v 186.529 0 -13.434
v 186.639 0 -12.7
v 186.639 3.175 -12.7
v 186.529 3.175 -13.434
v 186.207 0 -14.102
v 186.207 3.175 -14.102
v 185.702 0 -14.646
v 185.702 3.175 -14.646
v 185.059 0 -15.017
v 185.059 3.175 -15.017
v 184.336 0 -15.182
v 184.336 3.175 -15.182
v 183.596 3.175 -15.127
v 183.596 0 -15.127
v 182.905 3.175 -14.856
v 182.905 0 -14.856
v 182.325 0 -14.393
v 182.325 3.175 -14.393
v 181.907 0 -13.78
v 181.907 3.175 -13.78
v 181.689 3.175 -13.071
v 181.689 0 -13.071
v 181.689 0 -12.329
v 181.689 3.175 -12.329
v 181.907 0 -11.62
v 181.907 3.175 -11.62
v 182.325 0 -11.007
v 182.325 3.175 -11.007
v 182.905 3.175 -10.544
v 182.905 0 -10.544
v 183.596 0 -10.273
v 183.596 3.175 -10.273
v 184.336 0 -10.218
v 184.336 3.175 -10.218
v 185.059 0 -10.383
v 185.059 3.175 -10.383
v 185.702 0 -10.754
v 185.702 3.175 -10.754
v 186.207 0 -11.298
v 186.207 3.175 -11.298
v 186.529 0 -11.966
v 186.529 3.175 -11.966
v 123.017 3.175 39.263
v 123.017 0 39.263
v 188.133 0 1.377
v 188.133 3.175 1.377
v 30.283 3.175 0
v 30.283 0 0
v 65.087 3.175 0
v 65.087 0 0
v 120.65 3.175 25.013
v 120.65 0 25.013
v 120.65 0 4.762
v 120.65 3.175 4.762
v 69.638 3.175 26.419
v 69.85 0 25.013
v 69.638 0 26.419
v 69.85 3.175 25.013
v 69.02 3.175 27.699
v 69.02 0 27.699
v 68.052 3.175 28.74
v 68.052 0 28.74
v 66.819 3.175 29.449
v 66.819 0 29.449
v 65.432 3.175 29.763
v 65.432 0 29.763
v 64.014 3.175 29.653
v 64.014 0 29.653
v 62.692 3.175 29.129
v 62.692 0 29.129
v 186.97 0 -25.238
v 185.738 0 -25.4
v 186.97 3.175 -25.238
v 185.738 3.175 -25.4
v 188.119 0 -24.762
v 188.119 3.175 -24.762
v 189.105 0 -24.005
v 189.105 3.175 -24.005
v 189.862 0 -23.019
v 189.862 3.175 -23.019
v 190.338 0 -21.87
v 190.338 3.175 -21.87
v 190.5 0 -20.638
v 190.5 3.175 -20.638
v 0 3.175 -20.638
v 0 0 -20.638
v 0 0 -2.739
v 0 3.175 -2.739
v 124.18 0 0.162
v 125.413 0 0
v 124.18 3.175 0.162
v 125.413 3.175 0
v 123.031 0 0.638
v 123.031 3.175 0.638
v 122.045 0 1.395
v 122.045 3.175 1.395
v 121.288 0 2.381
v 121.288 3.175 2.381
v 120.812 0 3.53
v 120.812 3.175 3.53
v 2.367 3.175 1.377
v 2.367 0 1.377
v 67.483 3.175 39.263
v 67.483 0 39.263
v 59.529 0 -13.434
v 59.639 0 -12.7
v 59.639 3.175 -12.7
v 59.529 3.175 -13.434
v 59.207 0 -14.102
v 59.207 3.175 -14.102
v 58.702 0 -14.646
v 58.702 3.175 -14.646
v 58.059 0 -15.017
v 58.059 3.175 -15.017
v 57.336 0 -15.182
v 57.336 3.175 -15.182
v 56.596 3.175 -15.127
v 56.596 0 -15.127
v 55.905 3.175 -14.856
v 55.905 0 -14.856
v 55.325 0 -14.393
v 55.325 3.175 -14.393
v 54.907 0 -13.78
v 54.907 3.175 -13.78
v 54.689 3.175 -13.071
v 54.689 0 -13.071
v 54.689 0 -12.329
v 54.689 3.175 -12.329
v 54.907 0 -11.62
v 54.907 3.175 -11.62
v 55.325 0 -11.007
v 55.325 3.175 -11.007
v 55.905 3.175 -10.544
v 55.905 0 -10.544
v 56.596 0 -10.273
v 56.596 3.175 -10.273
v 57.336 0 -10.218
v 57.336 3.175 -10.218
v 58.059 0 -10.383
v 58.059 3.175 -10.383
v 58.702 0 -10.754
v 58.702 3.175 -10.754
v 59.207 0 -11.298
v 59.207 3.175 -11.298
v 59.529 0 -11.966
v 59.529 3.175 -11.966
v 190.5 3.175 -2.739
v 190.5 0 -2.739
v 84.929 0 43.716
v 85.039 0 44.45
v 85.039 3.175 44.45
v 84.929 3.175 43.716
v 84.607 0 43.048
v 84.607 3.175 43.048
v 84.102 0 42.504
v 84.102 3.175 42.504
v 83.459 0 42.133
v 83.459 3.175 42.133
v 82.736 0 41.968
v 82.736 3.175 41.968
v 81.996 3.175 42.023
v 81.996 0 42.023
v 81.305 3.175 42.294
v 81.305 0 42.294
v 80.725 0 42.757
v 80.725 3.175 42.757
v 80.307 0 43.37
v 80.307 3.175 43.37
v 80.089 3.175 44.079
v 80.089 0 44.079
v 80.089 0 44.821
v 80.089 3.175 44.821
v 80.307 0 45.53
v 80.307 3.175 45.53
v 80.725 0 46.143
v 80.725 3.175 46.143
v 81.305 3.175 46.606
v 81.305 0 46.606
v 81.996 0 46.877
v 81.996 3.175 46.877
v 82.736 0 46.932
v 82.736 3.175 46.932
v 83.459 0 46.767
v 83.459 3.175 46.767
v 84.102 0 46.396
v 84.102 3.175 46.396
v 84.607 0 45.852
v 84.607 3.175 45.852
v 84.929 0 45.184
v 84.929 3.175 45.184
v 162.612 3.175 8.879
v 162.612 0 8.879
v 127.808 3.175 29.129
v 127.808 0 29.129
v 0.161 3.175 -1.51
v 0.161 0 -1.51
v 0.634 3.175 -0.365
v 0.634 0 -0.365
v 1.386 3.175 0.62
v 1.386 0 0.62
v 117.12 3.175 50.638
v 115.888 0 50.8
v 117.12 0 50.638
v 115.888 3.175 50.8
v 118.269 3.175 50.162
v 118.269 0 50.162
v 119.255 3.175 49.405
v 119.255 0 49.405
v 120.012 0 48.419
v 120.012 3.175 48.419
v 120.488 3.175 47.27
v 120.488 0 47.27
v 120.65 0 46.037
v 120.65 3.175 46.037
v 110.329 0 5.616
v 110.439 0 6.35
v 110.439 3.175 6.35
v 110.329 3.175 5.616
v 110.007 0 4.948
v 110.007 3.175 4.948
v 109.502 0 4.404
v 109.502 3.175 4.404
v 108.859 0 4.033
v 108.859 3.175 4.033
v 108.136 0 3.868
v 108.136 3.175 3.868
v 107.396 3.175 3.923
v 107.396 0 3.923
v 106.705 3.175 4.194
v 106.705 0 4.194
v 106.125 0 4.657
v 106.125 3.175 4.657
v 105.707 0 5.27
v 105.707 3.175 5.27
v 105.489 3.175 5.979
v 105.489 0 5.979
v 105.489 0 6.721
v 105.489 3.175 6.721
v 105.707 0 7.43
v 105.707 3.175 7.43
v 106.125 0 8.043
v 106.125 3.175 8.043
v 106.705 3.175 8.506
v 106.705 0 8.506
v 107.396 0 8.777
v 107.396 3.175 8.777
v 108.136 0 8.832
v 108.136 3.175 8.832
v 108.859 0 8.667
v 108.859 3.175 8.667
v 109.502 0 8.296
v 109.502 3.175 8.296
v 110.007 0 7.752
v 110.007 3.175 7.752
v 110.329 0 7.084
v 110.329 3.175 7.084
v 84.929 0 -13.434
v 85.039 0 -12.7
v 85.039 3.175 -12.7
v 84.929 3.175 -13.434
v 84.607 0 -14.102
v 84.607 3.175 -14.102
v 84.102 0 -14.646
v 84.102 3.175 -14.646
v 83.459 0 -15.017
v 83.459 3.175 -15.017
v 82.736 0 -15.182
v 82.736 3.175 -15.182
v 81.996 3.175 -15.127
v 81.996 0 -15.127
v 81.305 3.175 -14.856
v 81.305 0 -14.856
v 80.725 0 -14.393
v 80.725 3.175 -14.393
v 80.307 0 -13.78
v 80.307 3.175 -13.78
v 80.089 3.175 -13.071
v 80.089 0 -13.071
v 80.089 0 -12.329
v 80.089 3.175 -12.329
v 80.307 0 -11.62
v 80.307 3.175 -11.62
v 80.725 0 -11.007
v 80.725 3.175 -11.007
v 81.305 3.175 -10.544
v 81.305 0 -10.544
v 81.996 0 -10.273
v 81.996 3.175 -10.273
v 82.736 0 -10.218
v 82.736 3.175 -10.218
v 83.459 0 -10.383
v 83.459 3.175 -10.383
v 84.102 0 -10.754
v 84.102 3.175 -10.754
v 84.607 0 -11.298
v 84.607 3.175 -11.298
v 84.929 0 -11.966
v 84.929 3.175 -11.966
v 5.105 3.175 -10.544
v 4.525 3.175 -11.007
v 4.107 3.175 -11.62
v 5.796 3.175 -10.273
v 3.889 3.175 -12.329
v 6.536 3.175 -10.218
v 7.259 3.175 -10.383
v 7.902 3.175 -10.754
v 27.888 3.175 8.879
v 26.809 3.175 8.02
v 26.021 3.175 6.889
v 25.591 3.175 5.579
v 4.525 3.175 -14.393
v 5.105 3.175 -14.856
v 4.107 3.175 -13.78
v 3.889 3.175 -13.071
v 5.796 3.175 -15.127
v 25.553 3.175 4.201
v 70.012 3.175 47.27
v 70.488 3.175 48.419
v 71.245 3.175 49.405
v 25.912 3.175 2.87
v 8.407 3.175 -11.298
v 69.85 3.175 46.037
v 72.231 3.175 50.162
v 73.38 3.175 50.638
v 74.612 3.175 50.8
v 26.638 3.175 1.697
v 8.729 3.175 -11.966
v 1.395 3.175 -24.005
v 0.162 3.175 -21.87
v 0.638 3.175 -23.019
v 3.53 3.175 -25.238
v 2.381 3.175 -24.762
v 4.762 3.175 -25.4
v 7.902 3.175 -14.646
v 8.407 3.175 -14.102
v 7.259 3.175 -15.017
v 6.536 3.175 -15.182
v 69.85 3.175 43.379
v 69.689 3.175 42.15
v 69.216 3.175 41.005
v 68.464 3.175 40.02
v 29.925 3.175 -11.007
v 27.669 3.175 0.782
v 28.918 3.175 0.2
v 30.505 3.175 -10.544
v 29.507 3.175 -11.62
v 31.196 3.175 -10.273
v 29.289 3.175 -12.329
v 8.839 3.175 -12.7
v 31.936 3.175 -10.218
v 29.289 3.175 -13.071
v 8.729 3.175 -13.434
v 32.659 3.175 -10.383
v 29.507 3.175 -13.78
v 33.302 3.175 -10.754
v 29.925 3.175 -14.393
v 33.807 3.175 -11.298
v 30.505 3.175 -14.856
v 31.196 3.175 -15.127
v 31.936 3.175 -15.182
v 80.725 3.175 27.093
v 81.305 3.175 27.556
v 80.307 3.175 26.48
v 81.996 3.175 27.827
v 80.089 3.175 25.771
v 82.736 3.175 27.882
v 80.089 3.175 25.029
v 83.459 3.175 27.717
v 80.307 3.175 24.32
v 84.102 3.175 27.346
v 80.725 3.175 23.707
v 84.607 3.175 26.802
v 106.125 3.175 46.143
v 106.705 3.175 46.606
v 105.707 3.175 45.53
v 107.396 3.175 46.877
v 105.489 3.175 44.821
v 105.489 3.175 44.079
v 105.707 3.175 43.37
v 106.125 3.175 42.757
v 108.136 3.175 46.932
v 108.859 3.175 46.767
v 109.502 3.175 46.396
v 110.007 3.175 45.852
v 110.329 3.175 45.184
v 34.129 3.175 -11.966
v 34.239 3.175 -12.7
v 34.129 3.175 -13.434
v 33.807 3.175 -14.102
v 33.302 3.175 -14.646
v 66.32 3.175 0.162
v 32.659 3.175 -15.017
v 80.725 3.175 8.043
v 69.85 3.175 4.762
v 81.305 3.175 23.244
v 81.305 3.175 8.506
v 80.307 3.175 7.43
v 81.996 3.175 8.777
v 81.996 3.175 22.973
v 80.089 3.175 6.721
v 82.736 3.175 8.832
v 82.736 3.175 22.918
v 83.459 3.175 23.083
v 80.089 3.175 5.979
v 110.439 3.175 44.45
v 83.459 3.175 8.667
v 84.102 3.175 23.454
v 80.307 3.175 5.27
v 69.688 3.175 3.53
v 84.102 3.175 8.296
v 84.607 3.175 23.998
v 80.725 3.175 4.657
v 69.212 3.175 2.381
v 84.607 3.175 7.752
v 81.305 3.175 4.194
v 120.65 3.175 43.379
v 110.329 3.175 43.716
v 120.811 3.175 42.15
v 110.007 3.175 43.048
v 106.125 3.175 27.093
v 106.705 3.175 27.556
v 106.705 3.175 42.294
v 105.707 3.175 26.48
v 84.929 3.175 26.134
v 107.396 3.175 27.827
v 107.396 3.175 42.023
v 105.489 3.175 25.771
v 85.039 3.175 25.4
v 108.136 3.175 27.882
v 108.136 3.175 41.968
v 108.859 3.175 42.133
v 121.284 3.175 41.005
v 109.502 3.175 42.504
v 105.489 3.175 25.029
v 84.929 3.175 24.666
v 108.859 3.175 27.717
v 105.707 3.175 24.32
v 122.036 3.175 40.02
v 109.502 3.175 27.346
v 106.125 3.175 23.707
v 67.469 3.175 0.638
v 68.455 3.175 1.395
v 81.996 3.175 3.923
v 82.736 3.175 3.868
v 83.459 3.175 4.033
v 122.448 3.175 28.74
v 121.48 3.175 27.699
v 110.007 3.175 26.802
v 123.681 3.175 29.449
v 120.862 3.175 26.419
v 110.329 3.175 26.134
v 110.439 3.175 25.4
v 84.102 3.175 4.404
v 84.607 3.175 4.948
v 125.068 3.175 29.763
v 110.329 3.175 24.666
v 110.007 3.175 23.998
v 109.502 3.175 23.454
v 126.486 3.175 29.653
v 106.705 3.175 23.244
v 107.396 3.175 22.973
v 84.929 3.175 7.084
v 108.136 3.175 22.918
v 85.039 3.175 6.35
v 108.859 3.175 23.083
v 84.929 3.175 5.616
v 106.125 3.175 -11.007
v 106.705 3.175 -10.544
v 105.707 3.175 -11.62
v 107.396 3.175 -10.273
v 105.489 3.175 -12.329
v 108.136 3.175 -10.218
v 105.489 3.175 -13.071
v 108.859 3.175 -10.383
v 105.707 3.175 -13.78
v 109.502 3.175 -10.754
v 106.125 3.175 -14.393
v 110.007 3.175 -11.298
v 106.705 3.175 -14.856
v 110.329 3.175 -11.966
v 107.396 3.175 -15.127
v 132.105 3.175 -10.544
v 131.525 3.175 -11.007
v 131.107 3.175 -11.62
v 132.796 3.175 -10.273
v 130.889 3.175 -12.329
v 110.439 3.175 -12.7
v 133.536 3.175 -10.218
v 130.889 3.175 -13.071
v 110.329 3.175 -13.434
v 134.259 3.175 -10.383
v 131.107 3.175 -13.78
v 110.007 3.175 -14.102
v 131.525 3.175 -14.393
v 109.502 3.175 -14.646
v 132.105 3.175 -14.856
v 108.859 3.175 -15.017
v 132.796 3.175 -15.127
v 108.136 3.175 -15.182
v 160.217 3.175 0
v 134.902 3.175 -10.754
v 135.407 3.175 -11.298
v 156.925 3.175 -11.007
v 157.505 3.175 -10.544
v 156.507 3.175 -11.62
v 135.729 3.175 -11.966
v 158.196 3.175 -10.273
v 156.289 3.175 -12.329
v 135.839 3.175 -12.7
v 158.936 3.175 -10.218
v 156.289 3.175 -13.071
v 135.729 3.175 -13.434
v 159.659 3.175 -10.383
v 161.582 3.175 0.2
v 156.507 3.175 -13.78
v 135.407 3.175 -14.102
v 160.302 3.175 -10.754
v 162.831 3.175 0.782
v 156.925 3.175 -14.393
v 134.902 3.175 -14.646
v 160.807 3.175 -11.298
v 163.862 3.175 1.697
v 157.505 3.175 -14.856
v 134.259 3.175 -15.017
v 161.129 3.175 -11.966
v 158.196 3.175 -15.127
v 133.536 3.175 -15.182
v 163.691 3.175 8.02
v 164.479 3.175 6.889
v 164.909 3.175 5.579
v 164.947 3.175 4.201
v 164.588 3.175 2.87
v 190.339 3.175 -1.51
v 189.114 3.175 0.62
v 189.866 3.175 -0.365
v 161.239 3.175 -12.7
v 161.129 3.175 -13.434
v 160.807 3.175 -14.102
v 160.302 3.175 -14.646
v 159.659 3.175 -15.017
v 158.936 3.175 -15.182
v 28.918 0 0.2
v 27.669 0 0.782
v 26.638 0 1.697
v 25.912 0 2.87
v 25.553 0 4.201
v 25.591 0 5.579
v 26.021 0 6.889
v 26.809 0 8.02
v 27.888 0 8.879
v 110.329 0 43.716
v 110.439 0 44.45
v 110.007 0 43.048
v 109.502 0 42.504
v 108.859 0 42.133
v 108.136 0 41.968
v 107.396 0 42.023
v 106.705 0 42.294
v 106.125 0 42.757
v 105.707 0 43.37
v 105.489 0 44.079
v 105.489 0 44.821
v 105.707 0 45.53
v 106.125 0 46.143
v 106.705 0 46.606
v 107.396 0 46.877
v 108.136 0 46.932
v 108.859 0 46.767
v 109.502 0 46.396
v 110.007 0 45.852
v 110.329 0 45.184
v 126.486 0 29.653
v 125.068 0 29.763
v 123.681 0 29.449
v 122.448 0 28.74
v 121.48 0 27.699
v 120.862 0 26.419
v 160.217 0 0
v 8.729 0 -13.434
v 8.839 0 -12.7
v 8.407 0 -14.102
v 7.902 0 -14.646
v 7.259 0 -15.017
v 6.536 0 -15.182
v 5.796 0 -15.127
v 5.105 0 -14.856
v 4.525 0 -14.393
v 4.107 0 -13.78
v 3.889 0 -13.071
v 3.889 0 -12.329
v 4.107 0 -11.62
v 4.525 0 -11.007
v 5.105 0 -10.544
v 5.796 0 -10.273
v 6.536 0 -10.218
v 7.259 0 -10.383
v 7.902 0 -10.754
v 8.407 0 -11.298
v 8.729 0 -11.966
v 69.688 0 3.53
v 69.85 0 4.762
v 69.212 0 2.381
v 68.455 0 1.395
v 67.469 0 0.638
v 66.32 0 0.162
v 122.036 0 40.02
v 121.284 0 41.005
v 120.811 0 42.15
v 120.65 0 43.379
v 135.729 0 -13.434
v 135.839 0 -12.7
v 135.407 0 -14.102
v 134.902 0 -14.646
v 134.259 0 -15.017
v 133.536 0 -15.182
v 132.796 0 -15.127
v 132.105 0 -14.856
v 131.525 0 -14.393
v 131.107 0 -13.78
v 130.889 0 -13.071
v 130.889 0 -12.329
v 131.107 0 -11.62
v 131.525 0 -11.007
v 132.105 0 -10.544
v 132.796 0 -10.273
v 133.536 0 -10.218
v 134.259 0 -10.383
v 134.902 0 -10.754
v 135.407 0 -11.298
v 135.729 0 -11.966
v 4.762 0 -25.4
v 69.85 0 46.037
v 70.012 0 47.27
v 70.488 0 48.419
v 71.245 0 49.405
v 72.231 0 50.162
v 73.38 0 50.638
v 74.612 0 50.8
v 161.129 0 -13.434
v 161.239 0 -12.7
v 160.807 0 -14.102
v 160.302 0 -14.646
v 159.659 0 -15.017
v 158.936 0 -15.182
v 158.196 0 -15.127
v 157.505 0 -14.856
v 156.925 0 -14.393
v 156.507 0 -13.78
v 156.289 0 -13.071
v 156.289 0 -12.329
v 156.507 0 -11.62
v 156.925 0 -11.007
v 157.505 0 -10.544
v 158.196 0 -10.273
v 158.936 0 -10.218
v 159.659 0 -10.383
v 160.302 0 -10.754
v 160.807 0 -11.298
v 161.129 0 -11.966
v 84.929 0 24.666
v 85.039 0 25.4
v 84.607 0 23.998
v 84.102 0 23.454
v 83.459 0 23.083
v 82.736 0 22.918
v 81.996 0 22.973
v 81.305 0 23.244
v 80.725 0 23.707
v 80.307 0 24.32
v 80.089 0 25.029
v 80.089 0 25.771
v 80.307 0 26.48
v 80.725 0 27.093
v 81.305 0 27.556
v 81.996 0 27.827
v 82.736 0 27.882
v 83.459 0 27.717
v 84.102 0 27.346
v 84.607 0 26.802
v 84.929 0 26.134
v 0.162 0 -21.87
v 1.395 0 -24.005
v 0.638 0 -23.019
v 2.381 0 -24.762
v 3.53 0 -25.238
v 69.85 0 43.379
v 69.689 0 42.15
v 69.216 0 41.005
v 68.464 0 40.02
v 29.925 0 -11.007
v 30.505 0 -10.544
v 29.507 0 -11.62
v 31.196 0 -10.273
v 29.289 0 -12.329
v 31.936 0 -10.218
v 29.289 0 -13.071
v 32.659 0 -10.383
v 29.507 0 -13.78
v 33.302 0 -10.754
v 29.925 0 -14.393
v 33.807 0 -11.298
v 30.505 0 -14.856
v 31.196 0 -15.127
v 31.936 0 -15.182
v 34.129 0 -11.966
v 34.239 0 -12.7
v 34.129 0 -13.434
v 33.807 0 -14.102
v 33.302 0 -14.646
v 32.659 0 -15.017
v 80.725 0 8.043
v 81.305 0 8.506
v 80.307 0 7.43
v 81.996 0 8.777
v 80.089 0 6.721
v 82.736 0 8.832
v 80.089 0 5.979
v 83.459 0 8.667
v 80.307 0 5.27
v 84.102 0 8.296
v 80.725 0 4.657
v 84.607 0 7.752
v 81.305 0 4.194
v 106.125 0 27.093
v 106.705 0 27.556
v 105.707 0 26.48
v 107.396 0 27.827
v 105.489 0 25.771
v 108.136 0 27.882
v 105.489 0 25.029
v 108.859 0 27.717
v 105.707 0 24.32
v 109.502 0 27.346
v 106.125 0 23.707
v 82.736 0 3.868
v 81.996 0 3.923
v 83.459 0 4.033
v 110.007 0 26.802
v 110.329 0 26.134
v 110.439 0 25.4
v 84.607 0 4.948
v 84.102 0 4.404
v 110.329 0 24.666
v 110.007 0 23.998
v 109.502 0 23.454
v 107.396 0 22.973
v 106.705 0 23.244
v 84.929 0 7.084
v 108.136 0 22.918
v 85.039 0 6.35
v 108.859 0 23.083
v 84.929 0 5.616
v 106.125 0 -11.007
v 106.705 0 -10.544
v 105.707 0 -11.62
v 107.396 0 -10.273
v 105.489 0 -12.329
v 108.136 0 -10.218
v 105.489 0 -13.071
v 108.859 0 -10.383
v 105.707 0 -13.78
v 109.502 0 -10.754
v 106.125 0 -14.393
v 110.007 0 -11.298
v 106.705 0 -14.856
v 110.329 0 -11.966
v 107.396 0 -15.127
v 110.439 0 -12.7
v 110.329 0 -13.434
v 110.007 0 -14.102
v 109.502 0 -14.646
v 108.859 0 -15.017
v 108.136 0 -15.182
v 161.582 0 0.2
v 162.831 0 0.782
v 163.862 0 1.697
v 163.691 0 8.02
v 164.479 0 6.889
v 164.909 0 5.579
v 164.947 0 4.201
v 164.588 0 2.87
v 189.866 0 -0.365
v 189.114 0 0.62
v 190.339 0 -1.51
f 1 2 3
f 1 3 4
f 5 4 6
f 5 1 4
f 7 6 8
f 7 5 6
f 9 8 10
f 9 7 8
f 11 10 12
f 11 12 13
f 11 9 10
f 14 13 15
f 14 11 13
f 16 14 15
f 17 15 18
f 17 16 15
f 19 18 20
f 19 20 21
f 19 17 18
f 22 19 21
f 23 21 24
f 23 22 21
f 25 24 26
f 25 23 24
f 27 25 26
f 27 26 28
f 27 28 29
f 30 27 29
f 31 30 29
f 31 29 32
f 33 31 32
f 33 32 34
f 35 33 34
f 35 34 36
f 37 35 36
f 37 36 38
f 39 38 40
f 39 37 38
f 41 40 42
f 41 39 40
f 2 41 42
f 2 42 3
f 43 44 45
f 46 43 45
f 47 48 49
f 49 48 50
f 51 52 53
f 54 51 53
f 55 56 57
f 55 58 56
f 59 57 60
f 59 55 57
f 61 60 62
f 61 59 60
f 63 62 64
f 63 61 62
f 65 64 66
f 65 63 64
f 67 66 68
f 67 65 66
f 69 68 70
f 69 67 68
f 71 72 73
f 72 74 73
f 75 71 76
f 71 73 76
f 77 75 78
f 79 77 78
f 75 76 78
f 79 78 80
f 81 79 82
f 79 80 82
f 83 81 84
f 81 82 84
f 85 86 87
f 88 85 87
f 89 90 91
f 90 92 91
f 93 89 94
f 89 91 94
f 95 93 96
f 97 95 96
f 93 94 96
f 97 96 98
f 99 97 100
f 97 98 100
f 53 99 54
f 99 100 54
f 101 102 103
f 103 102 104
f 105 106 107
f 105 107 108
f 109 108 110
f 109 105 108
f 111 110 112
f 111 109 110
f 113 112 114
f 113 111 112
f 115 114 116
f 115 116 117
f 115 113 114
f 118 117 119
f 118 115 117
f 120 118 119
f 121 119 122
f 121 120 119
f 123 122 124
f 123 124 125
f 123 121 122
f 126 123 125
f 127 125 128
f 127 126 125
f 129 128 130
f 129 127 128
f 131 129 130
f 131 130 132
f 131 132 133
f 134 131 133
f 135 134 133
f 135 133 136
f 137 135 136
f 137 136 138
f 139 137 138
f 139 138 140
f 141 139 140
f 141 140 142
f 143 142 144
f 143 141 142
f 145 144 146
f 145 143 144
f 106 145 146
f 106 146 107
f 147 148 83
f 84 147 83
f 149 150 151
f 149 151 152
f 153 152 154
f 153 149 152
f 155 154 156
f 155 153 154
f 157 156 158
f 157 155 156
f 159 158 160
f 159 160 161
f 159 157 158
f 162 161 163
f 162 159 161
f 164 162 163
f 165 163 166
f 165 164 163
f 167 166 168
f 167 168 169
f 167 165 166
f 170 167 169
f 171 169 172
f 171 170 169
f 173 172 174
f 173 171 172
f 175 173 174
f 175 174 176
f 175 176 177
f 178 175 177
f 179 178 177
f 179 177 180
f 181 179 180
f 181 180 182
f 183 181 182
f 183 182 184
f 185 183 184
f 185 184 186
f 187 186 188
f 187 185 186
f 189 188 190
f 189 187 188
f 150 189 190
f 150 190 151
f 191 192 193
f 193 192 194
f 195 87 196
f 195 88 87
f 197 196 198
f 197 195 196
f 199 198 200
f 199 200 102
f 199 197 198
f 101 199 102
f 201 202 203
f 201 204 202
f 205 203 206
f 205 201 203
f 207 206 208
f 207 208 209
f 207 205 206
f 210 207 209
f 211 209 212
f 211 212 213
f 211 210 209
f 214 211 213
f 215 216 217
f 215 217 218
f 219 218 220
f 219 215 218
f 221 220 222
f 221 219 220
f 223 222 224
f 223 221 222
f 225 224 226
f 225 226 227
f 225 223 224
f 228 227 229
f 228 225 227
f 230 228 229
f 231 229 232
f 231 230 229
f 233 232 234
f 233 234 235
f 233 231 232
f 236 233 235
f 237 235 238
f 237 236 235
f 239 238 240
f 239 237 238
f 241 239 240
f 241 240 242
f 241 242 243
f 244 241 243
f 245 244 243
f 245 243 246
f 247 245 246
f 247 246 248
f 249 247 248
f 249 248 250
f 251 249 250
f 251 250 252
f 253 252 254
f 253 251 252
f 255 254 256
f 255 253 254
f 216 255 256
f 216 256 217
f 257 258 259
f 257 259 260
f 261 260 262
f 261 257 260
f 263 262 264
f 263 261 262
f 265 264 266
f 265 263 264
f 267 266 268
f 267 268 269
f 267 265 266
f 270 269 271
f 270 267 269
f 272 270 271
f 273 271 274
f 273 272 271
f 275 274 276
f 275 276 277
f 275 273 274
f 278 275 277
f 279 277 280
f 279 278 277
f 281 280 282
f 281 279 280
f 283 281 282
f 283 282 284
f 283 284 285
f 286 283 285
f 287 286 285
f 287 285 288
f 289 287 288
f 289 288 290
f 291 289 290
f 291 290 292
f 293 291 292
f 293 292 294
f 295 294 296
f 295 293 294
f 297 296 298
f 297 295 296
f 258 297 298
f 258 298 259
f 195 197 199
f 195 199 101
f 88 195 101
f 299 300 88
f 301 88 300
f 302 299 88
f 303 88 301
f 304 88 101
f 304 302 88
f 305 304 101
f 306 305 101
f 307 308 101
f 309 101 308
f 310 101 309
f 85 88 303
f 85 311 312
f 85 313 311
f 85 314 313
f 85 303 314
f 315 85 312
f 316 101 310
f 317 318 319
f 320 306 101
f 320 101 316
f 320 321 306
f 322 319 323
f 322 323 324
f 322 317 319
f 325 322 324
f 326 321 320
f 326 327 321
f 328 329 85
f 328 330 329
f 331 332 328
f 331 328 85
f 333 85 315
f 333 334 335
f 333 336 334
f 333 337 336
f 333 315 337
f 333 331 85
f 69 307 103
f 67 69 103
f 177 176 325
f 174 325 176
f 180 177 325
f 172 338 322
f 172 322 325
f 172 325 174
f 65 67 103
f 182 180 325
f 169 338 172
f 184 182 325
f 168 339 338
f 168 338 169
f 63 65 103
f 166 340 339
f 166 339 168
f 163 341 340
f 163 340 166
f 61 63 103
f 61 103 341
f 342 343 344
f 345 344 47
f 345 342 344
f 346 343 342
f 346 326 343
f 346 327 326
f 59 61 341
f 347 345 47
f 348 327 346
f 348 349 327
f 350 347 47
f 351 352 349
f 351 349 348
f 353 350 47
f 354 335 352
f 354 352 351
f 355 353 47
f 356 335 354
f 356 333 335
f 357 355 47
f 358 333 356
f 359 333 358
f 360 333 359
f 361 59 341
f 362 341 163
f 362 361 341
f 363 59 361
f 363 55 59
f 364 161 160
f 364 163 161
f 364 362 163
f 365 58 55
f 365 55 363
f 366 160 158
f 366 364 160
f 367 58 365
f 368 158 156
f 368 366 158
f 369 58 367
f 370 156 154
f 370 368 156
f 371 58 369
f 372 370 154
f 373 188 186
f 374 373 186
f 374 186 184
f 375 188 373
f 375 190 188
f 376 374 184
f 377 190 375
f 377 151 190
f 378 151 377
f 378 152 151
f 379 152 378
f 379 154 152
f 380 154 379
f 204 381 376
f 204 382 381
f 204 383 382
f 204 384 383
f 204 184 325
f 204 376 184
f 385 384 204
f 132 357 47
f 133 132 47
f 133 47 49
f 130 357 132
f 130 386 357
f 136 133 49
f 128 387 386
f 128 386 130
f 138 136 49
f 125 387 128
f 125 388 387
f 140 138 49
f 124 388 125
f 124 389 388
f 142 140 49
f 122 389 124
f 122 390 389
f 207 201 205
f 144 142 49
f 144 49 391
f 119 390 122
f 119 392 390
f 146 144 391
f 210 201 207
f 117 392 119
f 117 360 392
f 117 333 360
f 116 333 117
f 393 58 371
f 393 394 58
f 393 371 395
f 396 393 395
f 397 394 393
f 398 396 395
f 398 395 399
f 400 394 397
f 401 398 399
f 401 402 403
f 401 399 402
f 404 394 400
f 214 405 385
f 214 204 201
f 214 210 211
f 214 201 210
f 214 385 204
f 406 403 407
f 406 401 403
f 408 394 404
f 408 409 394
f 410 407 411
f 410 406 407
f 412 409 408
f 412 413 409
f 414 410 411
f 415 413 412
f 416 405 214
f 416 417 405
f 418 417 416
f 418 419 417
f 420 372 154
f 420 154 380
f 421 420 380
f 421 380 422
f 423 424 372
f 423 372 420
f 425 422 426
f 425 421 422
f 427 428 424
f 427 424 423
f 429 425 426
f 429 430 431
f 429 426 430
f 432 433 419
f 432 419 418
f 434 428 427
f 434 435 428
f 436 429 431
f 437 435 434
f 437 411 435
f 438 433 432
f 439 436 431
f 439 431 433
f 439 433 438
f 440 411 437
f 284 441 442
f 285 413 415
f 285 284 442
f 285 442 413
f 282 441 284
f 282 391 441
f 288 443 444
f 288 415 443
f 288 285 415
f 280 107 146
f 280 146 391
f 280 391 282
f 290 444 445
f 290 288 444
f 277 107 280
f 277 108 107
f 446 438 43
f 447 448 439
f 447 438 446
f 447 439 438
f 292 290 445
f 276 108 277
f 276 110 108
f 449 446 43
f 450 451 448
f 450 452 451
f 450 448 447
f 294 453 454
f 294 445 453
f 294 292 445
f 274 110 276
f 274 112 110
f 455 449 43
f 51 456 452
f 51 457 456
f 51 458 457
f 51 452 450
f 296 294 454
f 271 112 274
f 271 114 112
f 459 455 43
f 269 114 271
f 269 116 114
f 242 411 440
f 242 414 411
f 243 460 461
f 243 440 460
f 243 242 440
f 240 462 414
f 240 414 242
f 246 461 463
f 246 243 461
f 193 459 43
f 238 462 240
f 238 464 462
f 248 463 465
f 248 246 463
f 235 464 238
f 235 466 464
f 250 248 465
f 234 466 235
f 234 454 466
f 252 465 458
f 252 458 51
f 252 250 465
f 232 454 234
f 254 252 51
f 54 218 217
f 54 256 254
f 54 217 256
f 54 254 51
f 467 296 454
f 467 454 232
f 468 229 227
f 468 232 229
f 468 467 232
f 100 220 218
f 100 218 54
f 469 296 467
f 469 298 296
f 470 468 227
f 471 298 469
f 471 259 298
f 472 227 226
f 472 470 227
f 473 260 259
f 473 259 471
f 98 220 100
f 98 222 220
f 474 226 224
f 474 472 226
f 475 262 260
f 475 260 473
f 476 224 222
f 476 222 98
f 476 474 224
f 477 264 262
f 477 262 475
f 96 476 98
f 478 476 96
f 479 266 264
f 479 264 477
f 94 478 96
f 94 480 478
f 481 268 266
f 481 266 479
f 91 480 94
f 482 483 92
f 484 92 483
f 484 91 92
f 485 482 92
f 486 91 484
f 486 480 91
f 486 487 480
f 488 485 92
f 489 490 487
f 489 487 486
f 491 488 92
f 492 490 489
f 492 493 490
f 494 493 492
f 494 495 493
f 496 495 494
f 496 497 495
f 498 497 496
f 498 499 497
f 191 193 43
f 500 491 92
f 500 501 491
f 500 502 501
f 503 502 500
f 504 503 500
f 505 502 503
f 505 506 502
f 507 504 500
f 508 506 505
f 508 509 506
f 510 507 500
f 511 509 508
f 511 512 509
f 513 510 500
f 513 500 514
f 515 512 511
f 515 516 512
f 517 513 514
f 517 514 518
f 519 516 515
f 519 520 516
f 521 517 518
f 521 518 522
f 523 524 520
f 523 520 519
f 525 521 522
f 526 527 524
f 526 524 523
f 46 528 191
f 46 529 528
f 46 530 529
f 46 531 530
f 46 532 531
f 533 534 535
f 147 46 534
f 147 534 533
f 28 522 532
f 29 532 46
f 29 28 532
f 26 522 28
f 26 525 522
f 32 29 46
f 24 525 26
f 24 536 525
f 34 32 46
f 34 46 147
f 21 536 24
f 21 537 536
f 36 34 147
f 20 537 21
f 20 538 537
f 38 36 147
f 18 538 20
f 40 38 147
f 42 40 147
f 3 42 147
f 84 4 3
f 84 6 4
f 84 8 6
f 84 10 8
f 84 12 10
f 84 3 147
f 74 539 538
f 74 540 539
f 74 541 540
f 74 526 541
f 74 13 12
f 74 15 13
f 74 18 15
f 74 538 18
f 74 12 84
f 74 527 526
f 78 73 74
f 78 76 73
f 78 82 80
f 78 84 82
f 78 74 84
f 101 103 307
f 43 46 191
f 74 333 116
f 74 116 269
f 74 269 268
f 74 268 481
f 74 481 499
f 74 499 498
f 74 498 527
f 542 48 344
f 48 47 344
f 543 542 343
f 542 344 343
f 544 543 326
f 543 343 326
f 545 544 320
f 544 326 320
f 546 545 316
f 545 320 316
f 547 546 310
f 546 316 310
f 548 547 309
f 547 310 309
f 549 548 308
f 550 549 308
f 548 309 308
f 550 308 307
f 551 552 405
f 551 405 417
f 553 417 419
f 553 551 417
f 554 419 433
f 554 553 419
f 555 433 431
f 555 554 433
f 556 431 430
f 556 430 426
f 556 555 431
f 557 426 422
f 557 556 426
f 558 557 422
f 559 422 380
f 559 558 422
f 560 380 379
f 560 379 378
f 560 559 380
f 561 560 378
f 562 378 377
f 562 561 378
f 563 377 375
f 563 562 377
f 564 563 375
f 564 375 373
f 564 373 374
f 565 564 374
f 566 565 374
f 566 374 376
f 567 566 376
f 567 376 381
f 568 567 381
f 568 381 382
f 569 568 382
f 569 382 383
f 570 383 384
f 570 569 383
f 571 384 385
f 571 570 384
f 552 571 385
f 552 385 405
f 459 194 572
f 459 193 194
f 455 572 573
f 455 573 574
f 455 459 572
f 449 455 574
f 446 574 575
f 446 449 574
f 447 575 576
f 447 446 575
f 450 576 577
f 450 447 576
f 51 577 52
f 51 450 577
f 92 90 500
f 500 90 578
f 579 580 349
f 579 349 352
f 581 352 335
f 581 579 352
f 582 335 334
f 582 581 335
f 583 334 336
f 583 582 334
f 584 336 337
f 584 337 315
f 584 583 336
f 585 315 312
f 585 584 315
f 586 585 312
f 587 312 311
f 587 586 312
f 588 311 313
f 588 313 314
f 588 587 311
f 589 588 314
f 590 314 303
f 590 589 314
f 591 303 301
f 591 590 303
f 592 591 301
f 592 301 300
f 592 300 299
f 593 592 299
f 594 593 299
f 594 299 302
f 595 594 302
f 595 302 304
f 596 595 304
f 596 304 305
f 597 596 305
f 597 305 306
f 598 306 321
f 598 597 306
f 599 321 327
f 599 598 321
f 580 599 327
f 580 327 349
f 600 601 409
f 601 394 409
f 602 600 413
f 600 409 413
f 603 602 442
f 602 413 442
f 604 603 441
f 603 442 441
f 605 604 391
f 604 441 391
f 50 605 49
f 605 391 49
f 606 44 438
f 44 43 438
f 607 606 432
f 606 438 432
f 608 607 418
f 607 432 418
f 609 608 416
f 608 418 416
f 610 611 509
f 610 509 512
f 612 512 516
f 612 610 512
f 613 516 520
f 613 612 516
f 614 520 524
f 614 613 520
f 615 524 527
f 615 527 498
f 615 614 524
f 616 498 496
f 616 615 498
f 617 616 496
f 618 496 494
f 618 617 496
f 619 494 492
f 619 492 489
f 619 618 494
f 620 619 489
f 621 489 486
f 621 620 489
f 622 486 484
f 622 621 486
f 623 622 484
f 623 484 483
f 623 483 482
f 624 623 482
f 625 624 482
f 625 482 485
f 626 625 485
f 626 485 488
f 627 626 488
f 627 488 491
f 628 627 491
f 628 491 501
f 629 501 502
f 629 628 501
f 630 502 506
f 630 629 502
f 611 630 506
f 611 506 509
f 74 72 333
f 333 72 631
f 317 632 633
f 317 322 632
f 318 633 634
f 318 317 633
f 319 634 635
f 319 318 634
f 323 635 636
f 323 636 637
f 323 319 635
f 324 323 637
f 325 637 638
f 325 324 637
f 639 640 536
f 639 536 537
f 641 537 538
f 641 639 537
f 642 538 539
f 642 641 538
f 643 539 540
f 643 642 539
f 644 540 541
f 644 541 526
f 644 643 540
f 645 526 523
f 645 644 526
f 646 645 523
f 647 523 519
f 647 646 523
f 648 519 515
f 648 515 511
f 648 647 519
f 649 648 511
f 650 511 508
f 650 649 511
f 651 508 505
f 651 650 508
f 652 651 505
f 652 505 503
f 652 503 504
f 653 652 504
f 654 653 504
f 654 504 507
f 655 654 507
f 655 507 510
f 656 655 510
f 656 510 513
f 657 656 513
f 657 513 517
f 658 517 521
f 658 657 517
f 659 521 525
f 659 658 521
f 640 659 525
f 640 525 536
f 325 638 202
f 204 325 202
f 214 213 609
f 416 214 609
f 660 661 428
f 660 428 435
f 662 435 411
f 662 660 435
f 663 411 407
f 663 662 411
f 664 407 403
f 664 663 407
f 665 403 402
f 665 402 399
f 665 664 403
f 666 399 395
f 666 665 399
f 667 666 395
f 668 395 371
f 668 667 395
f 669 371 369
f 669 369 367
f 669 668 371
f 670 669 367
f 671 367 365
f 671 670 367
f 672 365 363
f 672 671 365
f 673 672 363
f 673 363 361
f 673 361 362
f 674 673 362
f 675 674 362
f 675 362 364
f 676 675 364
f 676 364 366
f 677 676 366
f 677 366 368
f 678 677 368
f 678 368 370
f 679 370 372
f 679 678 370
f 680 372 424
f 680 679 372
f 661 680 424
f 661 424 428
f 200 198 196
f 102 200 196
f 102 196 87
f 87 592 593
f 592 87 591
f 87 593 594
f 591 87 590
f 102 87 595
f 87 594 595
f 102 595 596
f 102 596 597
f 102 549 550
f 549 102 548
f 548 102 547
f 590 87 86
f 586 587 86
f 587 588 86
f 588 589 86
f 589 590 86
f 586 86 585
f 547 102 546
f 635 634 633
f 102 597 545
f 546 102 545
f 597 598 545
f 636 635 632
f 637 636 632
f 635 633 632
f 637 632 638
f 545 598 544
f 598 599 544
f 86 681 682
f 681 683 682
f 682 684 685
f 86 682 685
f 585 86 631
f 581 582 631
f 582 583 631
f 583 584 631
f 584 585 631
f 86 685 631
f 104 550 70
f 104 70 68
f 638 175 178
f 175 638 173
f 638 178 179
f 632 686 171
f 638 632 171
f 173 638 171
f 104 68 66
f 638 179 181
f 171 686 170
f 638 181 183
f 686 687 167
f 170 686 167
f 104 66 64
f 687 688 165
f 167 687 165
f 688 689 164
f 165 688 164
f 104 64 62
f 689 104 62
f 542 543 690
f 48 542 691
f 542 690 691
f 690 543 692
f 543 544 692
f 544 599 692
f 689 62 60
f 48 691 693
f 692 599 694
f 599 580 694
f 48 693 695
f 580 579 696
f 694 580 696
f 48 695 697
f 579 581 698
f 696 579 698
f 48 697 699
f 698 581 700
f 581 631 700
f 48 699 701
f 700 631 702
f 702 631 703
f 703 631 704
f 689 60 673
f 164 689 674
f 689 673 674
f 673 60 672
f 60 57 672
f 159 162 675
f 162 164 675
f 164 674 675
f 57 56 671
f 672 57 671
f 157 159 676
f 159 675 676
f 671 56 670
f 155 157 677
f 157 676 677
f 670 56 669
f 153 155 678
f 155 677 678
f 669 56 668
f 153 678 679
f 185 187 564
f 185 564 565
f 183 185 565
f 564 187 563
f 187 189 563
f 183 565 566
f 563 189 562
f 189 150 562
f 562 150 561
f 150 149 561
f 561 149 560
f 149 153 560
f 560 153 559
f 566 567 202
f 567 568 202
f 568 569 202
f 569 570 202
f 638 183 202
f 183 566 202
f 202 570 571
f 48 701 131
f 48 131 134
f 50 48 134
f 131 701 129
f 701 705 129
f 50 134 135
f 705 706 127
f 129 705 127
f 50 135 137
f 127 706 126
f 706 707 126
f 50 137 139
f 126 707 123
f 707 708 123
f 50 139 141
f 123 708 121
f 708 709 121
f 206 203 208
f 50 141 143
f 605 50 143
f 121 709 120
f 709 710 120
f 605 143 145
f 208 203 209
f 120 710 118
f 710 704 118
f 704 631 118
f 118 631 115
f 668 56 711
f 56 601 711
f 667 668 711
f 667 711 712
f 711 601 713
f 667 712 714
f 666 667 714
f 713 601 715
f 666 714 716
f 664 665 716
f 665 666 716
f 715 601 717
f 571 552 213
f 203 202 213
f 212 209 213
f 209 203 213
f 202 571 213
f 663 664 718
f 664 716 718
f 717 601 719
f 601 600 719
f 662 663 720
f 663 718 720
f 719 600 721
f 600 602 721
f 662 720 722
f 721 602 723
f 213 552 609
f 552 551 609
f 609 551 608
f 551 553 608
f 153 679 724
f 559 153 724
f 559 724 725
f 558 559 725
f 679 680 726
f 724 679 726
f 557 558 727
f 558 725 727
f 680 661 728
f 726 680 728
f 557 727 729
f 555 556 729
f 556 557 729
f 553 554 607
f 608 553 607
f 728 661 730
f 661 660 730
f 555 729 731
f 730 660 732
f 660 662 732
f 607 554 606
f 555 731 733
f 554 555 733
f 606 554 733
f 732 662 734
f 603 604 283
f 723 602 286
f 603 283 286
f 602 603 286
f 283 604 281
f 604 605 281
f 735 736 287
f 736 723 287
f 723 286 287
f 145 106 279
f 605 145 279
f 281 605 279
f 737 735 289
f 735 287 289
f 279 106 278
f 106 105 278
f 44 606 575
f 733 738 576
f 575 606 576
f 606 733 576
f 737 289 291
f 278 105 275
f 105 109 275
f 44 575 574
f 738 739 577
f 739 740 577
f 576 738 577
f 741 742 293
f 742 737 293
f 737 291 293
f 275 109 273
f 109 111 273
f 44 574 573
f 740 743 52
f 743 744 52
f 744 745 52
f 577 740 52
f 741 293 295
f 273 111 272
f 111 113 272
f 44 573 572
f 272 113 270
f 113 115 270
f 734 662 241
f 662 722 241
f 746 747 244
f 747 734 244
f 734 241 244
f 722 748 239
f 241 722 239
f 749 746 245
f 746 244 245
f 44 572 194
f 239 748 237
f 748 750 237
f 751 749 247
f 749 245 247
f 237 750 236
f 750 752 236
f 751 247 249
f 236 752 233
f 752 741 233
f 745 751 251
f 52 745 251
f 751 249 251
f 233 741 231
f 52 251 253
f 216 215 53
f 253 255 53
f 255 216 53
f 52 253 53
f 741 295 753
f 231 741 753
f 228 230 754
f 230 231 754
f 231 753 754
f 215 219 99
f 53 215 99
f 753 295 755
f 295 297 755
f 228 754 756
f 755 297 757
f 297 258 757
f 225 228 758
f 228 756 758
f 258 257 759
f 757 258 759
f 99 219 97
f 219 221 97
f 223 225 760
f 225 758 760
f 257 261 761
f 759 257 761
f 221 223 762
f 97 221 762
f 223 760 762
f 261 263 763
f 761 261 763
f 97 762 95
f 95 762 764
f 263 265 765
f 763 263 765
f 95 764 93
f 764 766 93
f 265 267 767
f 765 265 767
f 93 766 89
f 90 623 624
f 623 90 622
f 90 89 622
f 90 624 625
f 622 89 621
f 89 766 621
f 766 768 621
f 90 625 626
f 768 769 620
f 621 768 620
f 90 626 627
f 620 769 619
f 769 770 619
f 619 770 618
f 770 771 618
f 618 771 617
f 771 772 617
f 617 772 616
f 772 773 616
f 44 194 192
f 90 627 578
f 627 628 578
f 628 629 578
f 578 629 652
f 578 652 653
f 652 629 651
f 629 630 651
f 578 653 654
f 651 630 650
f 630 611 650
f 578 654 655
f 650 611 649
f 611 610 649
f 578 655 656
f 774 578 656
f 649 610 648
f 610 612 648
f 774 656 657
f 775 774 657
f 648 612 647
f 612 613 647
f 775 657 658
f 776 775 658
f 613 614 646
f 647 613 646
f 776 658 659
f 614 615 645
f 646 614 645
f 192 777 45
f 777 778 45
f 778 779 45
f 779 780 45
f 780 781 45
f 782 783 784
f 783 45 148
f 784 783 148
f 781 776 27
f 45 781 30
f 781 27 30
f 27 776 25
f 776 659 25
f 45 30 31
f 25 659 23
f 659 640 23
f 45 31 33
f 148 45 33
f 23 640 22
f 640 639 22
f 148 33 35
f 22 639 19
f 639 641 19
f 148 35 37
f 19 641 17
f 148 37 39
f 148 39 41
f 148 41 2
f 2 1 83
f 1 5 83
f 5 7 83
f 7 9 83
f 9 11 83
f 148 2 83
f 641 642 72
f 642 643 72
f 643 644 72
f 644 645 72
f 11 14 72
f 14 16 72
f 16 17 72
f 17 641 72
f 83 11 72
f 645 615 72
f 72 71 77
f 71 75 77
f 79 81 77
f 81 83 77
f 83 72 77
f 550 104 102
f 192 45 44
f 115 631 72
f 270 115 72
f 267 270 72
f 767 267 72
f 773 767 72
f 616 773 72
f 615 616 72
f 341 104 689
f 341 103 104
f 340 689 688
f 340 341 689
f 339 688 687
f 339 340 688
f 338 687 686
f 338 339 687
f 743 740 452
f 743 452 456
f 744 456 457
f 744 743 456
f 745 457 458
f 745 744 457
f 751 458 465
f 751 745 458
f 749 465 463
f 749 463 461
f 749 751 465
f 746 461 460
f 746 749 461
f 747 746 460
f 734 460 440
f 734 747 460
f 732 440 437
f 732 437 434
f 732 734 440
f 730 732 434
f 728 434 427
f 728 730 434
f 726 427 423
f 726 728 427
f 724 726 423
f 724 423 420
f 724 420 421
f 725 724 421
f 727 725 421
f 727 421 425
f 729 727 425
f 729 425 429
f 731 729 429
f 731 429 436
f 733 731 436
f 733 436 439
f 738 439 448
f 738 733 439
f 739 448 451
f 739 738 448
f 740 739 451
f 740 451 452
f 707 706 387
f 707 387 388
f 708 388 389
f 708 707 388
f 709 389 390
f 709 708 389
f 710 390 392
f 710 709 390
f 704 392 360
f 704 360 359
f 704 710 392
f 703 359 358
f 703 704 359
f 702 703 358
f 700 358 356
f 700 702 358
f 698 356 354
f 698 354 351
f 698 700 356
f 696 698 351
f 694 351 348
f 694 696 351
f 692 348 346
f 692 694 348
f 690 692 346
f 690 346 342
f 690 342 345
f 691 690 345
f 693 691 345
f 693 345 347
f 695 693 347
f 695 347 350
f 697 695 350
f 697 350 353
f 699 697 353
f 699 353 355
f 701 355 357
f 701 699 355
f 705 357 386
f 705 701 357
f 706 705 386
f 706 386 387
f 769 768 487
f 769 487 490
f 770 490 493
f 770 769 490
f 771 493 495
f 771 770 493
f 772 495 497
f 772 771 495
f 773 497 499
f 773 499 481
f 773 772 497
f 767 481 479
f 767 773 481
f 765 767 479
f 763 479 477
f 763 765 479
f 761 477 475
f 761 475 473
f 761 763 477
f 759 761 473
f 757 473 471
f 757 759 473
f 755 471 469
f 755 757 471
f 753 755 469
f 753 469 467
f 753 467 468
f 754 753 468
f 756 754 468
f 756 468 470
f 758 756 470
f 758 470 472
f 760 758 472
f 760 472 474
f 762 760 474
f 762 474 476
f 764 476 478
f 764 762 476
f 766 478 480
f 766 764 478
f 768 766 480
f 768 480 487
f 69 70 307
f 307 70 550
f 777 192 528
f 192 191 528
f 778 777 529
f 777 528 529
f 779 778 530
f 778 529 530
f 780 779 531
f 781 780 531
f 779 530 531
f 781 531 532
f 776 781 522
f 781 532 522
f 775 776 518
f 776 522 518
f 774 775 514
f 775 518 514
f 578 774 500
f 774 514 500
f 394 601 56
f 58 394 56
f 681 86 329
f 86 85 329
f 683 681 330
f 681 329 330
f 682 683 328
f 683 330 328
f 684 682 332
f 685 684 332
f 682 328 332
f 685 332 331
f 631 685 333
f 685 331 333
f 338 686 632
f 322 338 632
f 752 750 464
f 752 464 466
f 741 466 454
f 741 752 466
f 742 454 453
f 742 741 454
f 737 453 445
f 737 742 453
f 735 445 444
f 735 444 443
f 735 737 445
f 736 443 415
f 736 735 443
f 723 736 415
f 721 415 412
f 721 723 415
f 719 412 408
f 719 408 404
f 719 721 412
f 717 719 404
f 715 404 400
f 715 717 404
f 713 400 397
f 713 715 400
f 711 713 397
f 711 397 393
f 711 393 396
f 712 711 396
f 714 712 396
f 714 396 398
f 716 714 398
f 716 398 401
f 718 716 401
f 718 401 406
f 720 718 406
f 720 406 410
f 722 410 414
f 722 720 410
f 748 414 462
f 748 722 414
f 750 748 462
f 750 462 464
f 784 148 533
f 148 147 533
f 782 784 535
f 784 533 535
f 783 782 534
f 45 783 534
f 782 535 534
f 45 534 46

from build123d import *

# Parameters (mm, degrees)
SKETCH1_R           = 2.4892
BOSS_EXTRUDE1_DEPTH = 3.175
FILLET1_R           = 4.7625


with BuildPart() as part:
    # Sketch1 → Boss-Extrude1 (new body)
    with BuildSketch(Plane(origin=(0, 0, 0), x_dir=(1, 0, 0), z_dir=(0, 1, 0))):
        Polygon((0, 25.4), (0, 0), (69.85, -40.64), (69.85, -50.8), (120.65, -50.8), (120.65, -40.64), (190.5, 0), (190.5, 25.4), align=None)
        Polygon((120.65, -33.293424872), (120.65, 0), (177.873073998, 0), align=None, mode=Mode.SUBTRACT)
        Polygon((69.85, -33.293424872), (12.626926002, 0), (69.85, 0), align=None, mode=Mode.SUBTRACT)
        with Locations((6.35, 12.7)):
            Circle(SKETCH1_R, mode=Mode.SUBTRACT)
        with Locations((31.75, 12.7)):
            Circle(SKETCH1_R, mode=Mode.SUBTRACT)
        with Locations((57.15, 12.7)):
            Circle(SKETCH1_R, mode=Mode.SUBTRACT)
        with Locations((82.55, 12.7)):
            Circle(SKETCH1_R, mode=Mode.SUBTRACT)
        with Locations((107.95, 12.7)):
            Circle(SKETCH1_R, mode=Mode.SUBTRACT)
        with Locations((133.35, 12.7)):
            Circle(SKETCH1_R, mode=Mode.SUBTRACT)
        with Locations((158.75, 12.7)):
            Circle(SKETCH1_R, mode=Mode.SUBTRACT)
        with Locations((184.15, 12.7)):
            Circle(SKETCH1_R, mode=Mode.SUBTRACT)
        with Locations((107.95, -6.35)):
            Circle(SKETCH1_R, mode=Mode.SUBTRACT)
        with Locations((82.55, -6.35)):
            Circle(SKETCH1_R, mode=Mode.SUBTRACT)
        with Locations((82.55, -44.45)):
            Circle(SKETCH1_R, mode=Mode.SUBTRACT)
        with Locations((82.55, -25.4)):
            Circle(SKETCH1_R, mode=Mode.SUBTRACT)
        with Locations((107.95, -44.45)):
            Circle(SKETCH1_R, mode=Mode.SUBTRACT)
        with Locations((107.95, -25.4)):
            Circle(SKETCH1_R, mode=Mode.SUBTRACT)
    extrude(amount=BOSS_EXTRUDE1_DEPTH)

    # Fillet1
    fillet1_edges = [part.edges().sort_by_distance(p)[0] for p in [
        (120.65, 1.5875, 33.293424872),
        (177.873073998, 1.5875, 0),
        (120.65, 1.5875, 0),
        (69.85, 1.5875, 33.293424872),
        (69.85, 1.5875, 0),
        (12.626926002, 1.5875, 0),
        (120.65, 1.5875, 40.64),
        (120.65, 1.5875, 50.8),
        (69.85, 1.5875, 50.8),
        (69.85, 1.5875, 40.64),
        (0, 1.5875, 0),
        (0, 1.5875, -25.4),
        (190.5, 1.5875, -25.4),
        (190.5, 1.5875, 0),
    ]]
    fillet(fillet1_edges, radius=FILLET1_R)


solid = part.part
